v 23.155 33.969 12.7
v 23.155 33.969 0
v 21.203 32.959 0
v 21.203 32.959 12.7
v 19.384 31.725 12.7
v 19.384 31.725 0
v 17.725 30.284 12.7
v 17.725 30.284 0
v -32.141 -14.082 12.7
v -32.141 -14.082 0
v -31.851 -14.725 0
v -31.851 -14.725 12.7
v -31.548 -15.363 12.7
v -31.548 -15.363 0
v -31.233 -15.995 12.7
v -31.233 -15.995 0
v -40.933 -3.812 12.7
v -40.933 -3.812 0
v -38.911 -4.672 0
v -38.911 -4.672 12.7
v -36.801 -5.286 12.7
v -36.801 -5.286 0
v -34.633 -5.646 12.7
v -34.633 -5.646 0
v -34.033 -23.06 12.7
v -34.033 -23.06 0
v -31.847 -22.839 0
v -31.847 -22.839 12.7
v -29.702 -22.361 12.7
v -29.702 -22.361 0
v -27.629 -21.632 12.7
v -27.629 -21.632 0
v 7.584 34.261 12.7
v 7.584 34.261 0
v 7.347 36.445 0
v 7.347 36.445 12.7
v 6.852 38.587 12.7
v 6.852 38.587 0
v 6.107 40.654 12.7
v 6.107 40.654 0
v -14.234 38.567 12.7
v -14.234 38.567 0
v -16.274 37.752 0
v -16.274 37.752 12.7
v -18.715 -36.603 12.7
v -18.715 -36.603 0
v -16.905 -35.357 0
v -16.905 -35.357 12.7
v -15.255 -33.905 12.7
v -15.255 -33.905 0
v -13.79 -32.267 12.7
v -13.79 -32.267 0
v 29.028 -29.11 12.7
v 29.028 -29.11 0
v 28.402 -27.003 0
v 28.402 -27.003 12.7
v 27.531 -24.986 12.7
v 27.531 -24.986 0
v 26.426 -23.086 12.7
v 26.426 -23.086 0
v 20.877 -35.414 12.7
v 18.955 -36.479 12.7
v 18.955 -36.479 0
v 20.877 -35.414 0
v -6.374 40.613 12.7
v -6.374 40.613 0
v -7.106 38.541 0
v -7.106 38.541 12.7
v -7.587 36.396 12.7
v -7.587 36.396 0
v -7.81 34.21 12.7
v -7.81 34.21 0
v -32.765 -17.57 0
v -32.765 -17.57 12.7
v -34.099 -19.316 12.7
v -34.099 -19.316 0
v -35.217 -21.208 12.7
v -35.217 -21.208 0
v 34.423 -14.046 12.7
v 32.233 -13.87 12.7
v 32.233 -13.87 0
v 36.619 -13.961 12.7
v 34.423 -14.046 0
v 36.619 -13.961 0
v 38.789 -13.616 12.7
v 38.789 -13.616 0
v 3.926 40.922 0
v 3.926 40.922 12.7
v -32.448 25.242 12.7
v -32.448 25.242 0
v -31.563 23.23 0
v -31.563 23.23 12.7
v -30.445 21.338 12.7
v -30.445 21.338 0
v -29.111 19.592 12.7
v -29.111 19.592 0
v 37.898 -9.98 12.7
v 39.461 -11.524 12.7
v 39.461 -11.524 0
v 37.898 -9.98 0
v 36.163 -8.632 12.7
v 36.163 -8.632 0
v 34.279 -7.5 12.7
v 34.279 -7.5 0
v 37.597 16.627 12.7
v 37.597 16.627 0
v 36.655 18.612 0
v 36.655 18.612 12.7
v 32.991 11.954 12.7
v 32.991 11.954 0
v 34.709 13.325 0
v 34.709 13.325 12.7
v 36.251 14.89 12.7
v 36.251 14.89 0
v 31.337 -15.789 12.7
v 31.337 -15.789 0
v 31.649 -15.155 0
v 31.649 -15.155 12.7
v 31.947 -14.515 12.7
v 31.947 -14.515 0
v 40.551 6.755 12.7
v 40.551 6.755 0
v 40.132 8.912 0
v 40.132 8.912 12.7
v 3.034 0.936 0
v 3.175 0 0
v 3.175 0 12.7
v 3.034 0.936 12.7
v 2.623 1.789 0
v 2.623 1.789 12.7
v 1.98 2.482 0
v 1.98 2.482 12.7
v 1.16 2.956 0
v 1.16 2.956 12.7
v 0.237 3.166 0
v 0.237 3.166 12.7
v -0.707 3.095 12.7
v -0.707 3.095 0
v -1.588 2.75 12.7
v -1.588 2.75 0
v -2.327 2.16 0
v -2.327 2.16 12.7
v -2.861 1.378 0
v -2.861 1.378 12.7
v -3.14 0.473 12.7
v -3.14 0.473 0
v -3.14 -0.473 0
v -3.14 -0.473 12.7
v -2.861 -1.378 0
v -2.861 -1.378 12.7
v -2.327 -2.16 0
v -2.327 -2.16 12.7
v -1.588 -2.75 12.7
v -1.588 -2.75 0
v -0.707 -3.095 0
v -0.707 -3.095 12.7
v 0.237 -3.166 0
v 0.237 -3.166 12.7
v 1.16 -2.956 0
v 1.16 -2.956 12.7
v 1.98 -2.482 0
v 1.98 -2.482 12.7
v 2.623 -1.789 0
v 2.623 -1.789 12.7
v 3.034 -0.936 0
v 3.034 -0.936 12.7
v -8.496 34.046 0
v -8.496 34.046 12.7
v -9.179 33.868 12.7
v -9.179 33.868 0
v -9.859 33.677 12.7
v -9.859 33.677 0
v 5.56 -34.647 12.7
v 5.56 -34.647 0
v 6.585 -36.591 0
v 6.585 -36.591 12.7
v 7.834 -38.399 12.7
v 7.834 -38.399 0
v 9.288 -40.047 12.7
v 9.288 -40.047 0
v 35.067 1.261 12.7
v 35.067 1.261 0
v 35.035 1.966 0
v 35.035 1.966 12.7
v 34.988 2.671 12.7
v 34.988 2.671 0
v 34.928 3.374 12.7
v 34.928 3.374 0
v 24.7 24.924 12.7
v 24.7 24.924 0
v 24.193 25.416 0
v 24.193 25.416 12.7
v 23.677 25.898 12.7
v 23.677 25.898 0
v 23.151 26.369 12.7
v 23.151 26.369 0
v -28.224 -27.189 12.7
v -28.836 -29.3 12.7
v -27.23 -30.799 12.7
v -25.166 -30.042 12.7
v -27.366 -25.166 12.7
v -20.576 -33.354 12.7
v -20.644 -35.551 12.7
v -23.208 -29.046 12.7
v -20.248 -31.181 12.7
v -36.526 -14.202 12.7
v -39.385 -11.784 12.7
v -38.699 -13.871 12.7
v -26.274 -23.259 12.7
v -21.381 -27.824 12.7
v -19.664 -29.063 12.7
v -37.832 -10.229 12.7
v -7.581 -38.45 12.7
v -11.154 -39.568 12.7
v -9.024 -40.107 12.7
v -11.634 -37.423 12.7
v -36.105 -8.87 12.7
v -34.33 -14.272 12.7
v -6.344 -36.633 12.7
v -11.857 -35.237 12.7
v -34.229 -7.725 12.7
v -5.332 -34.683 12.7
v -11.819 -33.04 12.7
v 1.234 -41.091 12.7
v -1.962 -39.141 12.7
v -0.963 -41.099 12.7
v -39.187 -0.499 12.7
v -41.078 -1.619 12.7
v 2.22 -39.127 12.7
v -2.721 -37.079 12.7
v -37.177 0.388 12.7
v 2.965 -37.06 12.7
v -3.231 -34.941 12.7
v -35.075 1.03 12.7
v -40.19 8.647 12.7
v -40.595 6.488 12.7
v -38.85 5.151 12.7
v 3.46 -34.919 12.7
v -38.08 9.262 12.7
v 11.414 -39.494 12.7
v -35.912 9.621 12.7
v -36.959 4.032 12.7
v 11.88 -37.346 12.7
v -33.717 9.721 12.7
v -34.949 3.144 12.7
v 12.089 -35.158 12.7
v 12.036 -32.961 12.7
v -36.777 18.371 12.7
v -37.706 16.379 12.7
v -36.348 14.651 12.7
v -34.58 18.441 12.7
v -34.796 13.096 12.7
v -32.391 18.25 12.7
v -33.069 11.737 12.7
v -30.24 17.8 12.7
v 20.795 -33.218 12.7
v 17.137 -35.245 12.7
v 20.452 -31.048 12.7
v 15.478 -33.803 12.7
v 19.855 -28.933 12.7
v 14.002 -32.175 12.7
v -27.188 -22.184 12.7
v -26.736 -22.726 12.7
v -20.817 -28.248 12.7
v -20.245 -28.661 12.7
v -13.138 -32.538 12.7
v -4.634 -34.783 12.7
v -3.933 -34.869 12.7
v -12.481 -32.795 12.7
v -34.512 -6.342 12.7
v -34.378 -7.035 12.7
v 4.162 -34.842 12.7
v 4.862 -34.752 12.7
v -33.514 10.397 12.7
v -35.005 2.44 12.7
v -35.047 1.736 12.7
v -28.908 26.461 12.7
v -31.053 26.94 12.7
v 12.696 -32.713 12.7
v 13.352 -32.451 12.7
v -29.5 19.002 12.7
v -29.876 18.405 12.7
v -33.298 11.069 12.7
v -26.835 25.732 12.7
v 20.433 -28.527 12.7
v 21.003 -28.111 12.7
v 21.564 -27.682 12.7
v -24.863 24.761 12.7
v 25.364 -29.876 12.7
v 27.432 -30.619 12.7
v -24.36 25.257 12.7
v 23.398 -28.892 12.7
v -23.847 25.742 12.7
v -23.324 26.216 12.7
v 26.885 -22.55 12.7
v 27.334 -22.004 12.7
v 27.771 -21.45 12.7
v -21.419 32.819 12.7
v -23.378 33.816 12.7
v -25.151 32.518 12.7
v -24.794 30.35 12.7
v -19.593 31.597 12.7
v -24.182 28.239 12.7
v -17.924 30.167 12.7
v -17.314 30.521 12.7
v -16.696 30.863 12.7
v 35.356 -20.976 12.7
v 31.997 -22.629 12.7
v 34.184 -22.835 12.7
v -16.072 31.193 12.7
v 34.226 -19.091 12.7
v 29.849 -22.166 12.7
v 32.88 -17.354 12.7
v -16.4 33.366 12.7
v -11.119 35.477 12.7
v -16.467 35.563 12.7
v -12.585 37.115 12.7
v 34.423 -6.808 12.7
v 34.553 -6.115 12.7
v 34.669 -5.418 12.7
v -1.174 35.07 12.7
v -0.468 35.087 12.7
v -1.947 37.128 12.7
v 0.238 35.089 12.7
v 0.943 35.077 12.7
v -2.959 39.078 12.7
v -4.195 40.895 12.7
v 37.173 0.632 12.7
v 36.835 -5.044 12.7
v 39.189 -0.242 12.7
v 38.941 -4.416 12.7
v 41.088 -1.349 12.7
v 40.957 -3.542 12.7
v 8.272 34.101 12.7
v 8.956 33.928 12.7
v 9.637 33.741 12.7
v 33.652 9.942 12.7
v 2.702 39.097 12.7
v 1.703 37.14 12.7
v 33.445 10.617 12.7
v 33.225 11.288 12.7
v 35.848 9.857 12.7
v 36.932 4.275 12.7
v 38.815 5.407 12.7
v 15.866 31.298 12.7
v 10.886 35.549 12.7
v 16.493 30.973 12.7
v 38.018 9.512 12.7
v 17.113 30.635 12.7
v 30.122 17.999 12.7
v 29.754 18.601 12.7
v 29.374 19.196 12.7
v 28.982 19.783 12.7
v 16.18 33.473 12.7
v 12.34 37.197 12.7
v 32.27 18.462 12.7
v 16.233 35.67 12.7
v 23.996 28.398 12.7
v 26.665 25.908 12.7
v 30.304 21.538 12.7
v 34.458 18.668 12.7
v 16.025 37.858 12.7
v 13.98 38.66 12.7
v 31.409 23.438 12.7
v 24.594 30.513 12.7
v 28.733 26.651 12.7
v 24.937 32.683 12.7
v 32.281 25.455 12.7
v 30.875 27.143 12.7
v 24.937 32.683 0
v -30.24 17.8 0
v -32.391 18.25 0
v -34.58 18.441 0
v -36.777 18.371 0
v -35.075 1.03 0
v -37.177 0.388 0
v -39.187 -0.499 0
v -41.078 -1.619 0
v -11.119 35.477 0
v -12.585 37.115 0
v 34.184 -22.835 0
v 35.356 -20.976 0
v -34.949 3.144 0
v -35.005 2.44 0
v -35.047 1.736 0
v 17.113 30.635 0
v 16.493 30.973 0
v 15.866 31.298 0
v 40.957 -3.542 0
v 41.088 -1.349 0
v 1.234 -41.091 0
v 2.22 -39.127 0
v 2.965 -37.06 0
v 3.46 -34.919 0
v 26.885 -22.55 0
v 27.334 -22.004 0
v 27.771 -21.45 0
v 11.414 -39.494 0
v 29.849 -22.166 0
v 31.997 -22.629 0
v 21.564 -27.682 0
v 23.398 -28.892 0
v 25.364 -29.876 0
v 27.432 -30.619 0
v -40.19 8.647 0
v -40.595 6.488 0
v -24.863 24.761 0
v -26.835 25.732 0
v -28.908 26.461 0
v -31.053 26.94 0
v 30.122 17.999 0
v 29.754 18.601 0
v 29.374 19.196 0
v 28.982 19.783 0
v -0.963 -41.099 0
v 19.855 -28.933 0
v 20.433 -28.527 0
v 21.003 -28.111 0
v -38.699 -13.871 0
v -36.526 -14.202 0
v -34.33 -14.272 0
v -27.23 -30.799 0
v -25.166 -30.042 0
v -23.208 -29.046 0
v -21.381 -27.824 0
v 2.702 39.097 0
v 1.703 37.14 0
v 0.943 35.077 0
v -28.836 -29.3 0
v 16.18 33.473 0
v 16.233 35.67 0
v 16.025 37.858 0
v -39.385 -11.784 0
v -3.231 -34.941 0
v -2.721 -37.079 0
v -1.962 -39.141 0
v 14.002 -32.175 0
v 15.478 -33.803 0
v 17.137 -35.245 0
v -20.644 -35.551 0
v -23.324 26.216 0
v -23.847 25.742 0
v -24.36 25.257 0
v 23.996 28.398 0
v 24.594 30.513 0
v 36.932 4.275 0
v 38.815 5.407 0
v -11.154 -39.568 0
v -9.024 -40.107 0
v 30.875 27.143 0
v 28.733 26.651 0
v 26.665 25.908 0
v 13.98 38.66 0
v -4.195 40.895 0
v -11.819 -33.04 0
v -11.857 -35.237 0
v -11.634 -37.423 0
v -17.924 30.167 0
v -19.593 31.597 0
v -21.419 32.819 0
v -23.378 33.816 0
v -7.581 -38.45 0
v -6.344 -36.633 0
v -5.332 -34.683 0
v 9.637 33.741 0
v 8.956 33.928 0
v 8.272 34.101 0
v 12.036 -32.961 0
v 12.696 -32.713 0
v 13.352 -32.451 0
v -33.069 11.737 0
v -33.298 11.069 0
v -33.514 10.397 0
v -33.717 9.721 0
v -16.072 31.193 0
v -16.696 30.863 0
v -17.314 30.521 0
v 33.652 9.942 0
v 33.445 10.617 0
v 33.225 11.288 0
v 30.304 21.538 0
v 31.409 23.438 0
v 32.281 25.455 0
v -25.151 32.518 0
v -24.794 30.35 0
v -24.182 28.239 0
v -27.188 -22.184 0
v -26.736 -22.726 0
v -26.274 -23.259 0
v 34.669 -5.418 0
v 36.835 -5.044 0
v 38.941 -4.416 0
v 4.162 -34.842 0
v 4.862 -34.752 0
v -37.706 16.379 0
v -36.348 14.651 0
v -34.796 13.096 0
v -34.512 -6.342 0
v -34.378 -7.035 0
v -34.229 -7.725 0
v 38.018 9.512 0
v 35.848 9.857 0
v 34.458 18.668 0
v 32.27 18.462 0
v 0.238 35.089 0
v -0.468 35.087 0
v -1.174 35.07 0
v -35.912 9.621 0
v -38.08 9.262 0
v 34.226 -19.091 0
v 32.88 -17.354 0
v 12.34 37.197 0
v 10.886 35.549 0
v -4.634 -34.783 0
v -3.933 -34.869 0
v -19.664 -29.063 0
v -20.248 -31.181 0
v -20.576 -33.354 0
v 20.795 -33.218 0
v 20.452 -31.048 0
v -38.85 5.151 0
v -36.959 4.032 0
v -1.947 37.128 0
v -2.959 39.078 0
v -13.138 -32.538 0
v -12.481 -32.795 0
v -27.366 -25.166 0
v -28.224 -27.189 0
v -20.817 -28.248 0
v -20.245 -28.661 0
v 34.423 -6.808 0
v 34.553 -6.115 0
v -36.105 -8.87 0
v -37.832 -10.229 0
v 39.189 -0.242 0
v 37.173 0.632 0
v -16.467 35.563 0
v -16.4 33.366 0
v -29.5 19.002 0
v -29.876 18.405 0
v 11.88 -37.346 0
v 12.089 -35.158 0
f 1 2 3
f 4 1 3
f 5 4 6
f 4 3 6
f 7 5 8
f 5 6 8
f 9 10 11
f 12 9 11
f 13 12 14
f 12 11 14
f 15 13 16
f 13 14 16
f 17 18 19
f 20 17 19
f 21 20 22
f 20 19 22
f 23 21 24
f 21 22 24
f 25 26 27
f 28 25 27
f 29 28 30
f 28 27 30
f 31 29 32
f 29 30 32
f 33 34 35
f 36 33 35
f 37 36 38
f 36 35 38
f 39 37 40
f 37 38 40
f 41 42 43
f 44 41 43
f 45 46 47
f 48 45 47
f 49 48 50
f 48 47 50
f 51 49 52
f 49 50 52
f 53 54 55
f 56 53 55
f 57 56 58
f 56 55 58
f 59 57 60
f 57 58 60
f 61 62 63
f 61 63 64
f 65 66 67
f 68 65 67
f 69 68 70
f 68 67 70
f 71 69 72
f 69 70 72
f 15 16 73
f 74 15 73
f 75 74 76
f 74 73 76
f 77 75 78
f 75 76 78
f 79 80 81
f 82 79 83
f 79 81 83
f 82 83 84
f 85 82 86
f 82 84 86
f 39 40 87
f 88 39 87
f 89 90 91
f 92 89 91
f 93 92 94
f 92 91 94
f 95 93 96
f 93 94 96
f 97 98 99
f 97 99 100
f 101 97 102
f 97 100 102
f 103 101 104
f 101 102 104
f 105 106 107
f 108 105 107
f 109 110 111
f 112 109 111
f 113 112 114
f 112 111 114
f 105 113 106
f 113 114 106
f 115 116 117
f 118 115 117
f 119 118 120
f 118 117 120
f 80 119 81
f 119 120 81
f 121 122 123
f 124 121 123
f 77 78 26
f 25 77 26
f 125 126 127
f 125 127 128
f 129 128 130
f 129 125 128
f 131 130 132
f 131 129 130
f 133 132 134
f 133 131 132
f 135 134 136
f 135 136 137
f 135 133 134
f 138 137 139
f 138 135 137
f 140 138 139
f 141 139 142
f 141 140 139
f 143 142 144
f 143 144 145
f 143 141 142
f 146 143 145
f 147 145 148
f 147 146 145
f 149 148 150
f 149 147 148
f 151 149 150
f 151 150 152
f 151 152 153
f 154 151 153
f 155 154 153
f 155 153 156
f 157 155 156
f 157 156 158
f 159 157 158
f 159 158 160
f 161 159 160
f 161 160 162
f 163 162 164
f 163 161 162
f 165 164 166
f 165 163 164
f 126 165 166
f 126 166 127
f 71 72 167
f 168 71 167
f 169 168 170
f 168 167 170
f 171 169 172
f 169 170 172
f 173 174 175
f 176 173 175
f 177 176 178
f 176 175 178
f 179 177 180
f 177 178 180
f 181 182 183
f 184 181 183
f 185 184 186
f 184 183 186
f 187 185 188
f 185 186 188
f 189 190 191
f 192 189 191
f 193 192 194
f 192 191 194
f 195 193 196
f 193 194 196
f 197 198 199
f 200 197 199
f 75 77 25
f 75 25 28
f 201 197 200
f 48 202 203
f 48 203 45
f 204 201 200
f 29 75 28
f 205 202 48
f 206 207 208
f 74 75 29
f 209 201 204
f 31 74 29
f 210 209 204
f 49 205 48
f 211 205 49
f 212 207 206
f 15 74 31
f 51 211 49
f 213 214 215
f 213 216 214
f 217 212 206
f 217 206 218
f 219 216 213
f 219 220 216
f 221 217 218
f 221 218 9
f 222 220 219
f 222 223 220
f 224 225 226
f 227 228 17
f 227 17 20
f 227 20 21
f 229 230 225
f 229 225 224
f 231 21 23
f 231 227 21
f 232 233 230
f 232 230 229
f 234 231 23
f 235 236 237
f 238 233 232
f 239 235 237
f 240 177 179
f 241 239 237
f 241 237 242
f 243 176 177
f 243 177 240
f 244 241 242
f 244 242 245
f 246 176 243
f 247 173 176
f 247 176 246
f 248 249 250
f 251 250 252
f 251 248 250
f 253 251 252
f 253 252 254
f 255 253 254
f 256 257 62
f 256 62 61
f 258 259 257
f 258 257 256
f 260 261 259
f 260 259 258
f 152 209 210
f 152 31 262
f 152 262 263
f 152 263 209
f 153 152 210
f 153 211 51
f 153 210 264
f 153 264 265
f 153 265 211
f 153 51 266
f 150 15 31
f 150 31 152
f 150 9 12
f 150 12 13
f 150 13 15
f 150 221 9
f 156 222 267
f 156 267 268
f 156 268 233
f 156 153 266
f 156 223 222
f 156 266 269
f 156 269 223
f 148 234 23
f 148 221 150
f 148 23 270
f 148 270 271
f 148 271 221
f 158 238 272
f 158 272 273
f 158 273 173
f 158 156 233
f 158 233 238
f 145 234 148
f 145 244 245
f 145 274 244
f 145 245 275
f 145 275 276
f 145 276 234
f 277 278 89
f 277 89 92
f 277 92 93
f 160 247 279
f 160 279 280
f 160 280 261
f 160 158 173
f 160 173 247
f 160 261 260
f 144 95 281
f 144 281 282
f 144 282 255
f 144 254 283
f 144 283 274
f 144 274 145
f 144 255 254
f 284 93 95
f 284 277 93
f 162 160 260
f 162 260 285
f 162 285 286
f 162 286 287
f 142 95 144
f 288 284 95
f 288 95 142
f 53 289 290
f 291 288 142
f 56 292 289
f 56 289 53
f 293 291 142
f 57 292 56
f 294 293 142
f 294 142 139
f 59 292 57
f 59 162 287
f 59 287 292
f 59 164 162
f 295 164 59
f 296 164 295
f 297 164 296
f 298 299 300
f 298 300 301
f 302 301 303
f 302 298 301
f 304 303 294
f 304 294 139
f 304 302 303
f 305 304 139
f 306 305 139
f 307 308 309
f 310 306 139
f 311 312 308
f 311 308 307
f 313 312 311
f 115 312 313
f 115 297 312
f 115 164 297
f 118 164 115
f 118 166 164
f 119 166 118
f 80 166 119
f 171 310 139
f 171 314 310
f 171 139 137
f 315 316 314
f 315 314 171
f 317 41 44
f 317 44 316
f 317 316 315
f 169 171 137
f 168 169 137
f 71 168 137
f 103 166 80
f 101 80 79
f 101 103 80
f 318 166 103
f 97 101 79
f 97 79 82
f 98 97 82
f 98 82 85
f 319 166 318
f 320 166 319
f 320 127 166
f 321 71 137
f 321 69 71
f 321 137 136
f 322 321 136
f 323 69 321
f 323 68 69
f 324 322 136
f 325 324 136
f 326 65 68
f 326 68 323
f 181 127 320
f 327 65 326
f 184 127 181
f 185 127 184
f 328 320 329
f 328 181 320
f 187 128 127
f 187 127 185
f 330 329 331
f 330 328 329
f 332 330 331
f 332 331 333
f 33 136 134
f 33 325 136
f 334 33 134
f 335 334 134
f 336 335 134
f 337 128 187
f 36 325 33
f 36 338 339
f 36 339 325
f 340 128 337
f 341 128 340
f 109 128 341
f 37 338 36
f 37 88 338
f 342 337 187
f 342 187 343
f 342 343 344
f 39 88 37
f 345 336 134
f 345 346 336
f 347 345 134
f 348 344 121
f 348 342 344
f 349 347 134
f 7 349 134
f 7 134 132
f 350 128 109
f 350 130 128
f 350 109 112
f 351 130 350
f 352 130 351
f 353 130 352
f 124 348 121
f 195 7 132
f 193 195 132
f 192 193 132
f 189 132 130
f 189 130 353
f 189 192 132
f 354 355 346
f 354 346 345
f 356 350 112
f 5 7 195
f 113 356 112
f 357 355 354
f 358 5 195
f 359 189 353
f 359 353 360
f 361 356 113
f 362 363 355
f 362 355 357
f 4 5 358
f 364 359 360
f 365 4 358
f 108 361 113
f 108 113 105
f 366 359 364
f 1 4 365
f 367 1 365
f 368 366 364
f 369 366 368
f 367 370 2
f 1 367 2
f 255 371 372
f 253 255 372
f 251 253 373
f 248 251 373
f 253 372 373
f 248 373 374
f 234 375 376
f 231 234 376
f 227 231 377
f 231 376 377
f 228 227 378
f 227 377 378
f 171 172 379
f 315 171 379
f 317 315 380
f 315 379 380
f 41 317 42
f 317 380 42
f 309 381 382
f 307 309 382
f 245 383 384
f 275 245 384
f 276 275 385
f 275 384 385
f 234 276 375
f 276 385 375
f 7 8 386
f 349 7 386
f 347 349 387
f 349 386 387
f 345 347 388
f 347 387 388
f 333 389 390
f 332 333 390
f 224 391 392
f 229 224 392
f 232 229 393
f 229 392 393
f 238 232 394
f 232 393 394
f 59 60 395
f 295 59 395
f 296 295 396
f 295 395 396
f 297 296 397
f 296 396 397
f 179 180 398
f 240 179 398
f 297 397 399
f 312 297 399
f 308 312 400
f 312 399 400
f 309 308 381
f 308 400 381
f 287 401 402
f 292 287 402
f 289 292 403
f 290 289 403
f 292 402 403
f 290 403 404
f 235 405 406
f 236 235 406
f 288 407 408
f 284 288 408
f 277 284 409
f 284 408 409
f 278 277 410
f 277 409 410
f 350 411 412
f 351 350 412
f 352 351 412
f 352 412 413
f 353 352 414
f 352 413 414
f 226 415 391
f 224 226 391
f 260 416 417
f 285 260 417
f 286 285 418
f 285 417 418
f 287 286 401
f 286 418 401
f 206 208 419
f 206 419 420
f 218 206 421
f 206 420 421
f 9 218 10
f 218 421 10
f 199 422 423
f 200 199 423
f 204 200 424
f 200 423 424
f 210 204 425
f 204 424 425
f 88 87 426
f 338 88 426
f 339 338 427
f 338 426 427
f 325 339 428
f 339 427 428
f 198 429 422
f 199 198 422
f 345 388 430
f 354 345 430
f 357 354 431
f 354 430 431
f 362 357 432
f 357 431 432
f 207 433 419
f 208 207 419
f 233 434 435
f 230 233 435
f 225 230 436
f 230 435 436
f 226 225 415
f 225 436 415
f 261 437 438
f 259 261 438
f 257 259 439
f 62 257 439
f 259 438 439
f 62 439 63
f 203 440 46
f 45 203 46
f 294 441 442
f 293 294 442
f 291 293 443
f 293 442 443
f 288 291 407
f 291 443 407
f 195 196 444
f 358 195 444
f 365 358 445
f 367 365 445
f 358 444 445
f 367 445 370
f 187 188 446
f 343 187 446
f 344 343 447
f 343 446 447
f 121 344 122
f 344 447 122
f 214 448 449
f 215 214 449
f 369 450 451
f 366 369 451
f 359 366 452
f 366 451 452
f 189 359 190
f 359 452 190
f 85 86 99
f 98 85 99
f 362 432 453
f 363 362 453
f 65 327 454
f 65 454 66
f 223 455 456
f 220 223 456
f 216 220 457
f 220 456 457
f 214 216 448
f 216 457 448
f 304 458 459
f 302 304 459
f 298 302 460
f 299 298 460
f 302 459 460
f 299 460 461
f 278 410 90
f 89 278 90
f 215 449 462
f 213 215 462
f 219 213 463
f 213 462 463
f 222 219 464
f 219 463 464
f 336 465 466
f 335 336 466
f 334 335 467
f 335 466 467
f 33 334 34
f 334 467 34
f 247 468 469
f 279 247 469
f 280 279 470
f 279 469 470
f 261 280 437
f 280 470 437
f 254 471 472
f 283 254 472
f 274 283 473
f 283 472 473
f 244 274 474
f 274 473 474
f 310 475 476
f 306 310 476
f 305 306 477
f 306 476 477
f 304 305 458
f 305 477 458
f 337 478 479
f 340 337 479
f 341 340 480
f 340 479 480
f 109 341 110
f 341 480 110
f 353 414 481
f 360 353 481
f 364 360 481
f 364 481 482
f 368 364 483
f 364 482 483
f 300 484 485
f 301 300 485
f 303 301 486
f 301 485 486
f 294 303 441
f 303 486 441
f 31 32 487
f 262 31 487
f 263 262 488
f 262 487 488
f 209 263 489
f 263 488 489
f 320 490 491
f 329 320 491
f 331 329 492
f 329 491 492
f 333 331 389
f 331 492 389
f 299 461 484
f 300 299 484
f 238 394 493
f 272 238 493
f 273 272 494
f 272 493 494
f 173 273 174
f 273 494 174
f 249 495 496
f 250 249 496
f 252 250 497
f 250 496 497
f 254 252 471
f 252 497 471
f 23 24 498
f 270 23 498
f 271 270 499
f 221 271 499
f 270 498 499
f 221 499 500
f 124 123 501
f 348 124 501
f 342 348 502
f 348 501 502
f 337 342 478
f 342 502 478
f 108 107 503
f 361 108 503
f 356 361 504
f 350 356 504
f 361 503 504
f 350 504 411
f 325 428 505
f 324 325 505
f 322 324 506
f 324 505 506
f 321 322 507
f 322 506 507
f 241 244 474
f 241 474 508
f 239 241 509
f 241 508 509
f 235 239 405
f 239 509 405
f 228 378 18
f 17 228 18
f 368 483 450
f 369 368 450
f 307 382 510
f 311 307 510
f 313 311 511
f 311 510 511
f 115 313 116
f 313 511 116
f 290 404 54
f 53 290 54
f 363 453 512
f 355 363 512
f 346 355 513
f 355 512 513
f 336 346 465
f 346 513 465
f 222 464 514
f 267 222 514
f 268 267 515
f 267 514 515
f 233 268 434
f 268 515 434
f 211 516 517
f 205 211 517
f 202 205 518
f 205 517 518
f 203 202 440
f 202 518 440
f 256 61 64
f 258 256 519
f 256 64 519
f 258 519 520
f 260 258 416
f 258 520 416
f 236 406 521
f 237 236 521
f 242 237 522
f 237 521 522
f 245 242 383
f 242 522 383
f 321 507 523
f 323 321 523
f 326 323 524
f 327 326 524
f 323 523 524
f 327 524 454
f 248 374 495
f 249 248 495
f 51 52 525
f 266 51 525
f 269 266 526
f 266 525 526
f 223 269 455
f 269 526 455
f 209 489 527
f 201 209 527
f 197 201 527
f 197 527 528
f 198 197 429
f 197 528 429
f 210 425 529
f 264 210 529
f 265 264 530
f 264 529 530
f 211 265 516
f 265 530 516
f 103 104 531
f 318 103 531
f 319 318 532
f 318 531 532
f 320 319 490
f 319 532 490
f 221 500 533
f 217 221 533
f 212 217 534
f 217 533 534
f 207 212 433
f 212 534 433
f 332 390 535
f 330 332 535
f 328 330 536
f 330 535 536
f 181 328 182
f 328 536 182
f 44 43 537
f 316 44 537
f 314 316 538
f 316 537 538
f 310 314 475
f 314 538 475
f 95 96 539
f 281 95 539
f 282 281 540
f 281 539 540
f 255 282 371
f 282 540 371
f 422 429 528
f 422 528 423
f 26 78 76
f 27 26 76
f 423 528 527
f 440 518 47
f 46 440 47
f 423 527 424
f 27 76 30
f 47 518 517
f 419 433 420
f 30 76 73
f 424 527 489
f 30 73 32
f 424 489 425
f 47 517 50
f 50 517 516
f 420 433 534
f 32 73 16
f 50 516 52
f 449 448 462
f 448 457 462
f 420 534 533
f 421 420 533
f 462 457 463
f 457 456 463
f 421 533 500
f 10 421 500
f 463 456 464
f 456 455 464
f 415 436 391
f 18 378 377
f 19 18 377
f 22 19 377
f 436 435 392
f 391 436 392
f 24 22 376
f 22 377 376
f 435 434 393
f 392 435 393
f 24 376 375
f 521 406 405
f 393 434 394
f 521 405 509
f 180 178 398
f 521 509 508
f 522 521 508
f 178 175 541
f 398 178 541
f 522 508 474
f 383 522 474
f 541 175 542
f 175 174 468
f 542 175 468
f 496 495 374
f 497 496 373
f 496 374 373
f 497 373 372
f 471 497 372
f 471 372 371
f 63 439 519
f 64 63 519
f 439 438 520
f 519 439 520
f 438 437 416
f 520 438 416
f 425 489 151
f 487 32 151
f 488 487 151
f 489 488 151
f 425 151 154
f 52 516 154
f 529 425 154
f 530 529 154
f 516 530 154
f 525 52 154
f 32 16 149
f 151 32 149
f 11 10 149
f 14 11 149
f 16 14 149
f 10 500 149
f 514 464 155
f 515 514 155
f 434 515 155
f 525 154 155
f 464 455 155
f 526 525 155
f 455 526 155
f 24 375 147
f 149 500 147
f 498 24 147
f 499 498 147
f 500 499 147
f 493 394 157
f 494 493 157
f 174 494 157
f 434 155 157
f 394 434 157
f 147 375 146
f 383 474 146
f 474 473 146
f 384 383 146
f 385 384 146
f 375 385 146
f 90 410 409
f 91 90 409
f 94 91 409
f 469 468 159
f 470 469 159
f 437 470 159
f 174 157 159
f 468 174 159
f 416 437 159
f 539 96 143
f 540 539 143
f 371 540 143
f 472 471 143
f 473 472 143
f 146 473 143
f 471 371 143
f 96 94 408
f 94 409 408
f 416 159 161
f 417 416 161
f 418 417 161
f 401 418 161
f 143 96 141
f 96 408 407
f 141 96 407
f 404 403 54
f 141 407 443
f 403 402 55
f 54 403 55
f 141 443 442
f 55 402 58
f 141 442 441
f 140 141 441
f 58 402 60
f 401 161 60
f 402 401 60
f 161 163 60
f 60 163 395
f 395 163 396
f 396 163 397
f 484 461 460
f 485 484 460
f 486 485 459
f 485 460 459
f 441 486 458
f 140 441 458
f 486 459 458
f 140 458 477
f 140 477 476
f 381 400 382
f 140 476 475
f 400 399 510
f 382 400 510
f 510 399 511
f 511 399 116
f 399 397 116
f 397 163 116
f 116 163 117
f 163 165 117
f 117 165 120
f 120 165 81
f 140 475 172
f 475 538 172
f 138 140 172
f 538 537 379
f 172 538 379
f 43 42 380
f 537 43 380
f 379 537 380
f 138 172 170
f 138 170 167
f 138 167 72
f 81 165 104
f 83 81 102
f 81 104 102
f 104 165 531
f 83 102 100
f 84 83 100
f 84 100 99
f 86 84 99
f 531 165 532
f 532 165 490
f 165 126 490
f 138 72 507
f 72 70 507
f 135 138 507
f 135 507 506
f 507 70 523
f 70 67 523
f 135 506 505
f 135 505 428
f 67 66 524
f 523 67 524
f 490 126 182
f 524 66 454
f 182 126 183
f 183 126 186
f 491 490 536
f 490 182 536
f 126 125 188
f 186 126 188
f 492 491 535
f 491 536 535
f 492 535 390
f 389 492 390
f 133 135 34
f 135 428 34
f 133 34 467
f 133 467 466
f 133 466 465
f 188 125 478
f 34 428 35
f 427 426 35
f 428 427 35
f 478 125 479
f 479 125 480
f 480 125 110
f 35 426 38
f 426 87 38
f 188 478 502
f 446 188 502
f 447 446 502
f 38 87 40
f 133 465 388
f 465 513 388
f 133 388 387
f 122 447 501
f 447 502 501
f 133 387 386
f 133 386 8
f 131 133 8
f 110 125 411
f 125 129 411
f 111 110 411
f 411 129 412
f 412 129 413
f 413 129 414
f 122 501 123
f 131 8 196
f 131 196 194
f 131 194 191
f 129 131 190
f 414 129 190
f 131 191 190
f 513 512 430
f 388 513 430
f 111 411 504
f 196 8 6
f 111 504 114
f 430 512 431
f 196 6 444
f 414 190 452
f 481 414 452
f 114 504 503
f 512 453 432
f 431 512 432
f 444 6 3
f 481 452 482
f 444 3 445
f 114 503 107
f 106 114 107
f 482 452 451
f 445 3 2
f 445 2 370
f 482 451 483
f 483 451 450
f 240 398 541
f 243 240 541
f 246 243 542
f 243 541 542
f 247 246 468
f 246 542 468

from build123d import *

# Parameters (mm, degrees)
SKETCH1_R        = 3.175
EXTRUSION2_DEPTH = 12.7


with BuildPart() as part:
    # Sketch1 → Extrusion2 (new body)
    with BuildSketch(Plane.XY):
        with BuildLine():
            Line((-14.233622753, 38.567186329), (-16.273931786, 37.751596287))
            ThreePointArc((-16.273931786, 37.751596287), (-16.466248372, 34.463305312), (-16.071921005, 31.19308374))
            ThreePointArc((-16.071921005, 31.19308374), (-17.005853093, 30.69390947), (-17.924297324, 30.166781125))
            ThreePointArc((-17.924297324, 30.166781125), (-20.487810109, 32.23517311), (-23.377716537, 33.815769214))
            Line((-23.377716537, 33.815769214), (-25.151096514, 32.51839821))
            ThreePointArc((-25.151096514, 32.51839821), (-24.51960641, 29.285587753), (-23.324396528, 26.216171433))
            ThreePointArc((-23.324396528, 26.216171433), (-24.10484783, 25.500420175), (-24.863345957, 24.761444744))
            ThreePointArc((-24.863345957, 24.761444744), (-27.860709444, 26.127334686), (-31.052902414, 26.939582953))
            Line((-31.052902414, 26.939582953), (-32.447925349, 25.241949579))
            ThreePointArc((-32.447925349, 25.241949579), (-31.0323074, 22.26774901), (-29.111314436, 19.592000659))
            ThreePointArc((-29.111314436, 19.592000659), (-29.689246325, 18.704645697), (-30.240139123, 17.800255724))
            ThreePointArc((-30.240139123, 17.800255724), (-33.483017939, 18.377819734), (-36.776920227, 18.370683619))
            Line((-36.776920227, 18.370683619), (-37.7059317, 16.379456422))
            ThreePointArc((-37.7059317, 16.379456422), (-35.595134387, 13.850745701), (-33.069061394, 11.736792429))
            ThreePointArc((-33.069061394, 11.736792429), (-33.408160285, 10.733589538), (-33.716833132, 9.720611171))
            ThreePointArc((-33.716833132, 9.720611171), (-37.001465276, 9.47355878), (-40.190108886, 8.64748667))
            Line((-40.190108886, 8.64748667), (-40.594735688, 6.487781779))
            ThreePointArc((-40.594735688, 6.487781779), (-37.921388171, 4.563449101), (-34.948957606, 3.144118365))
            ThreePointArc((-34.948957606, 3.144118365), (-35.027916668, 2.088102473), (-35.074974514, 1.030184869))
            ThreePointArc((-35.074974514, 1.030184869), (-38.194974467, -0.025960715), (-41.078005196, -1.619063669))
            Line((-41.078005196, -1.619063669), (-40.932823137, -3.811544054))
            ThreePointArc((-40.932823137, -3.811544054), (-37.864901671, -5.01058579), (-34.632882277, -5.646112218))
            ThreePointArc((-34.632882277, -5.646112218), (-34.446740222, -6.688587749), (-34.22922625, -7.724971737))
            ThreePointArc((-34.22922625, -7.724971737), (-36.988552942, -9.523849001), (-39.384819364, -11.783882284))
            Line((-39.384819364, -11.783882284), (-38.698950767, -13.871376555))
            ThreePointArc((-38.698950767, -13.871376555), (-35.429224142, -14.269787147), (-32.140695585, -14.081576806))
            ThreePointArc((-32.140695585, -14.081576806), (-31.701148402, -15.045009405), (-31.232729815, -15.994739958))
            ThreePointArc((-31.232729815, -15.994739958), (-33.4580046, -18.423318829), (-35.216940485, -21.208276236))
            Line((-35.216940485, -21.208276236), (-34.033480996, -23.059619453))
            ThreePointArc((-34.033480996, -23.059619453), (-30.76739816, -22.632365298), (-27.628990783, -21.632244135))
            ThreePointArc((-27.628990783, -21.632244135), (-26.96365684, -22.456097788), (-26.273766099, -23.259499844))
            ThreePointArc((-26.273766099, -23.259499844), (-27.82516678, -26.165183779), (-28.836251716, -29.300076195))
            Line((-28.836251716, -29.300076195), (-27.229562447, -30.798941653))
            ThreePointArc((-27.229562447, -30.798941653), (-24.172343397, -29.572868701), (-21.381254878, -27.823678007))
            ThreePointArc((-21.381254878, -27.823678007), (-20.531939552, -28.456186959), (-19.663925031, -29.062779812))
            ThreePointArc((-19.663925031, -29.062779812), (-20.443971397, -32.262994003), (-20.643675199, -35.550844607))
            Line((-20.643675199, -35.550844607), (-18.714710347, -36.603053078))
            ThreePointArc((-18.714710347, -36.603053078), (-16.058451399, -34.655200002), (-13.790056095, -32.266847861))
            ThreePointArc((-13.790056095, -32.266847861), (-12.810124992, -32.668269249), (-11.818527235, -33.039938438))
            ThreePointArc((-11.818527235, -33.039938438), (-11.778206103, -36.333601659), (-11.153980648, -39.567822706))
            Line((-11.153980648, -39.567822706), (-9.023944168, -40.107260062))
            ThreePointArc((-9.023944168, -40.107260062), (-6.935547841, -37.560017634), (-5.332377371, -34.682572995))
            ThreePointArc((-5.332377371, -34.682572995), (-4.283403166, -34.827684036), (-3.230527907, -34.941076221))
            ThreePointArc((-3.230527907, -34.941076221), (-2.372372803, -38.121235497), (-0.963440471, -41.098608985))
            Line((-0.963440471, -41.098608985), (1.233829612, -41.091380392))
            ThreePointArc((1.233829612, -41.091380392), (2.623141695, -38.104801222), (3.460354235, -34.919064515))
            ThreePointArc((3.460354235, -34.919064515), (4.512460635, -34.798747349), (5.560457371, -34.64673768))
            ThreePointArc((5.560457371, -34.64673768), (7.182525405, -37.513571908), (9.287636214, -40.04701851))
            Line((9.287636214, -40.04701851), (11.414077338, -39.493578168))
            ThreePointArc((11.414077338, -39.493578168), (12.017009592, -36.255320009), (12.035659057, -32.961462787))
            ThreePointArc((12.035659057, -32.961462787), (13.024789938, -32.583277384), (14.002058661, -32.175417188))
            ThreePointArc((14.002058661, -32.175417188), (16.286119127, -34.548792632), (18.955136559, -36.47912658))
            Line((18.955136559, -36.47912658), (20.877136608, -35.414249181))
            ThreePointArc((20.877136608, -35.414249181), (20.65580458, -32.127783703), (19.854719157, -28.932771129))
            ThreePointArc((19.854719157, -28.932771129), (20.718723787, -28.320480269), (21.563859111, -27.682396902))
            ThreePointArc((21.563859111, -27.682396902), (24.366396088, -29.413185652), (27.431615961, -30.619116966))
            Line((27.431615961, -30.619116966), (29.028408604, -29.109712673))
            ThreePointArc((29.028408604, -29.109712673), (27.9967194, -25.981540589), (26.426234232, -23.086127053))
            ThreePointArc((26.426234232, -23.086127053), (27.110824023, -22.278203223), (27.770722986, -21.44998981))
            ThreePointArc((27.770722986, -21.44998981), (30.915642769, -22.429440044), (34.184466045, -22.835195624))
            Line((34.184466045, -22.835195624), (35.355718928, -20.97610586))
            ThreePointArc((35.355718928, -20.97610586), (33.578497375, -18.202781726), (31.337291821, -15.78889671))
            ThreePointArc((31.337291821, -15.78889671), (31.799451478, -14.836104734), (32.232650202, -13.869800971))
            ThreePointArc((32.232650202, -13.869800971), (35.522345915, -14.036370229), (38.789380407, -13.616454959))
            Line((38.789380407, -13.616454959), (39.461499403, -11.524493171))
            ThreePointArc((39.461499403, -11.524493171), (37.050414867, -9.280275142), (34.279312115, -7.499591919))
            ThreePointArc((34.279312115, -7.499591919), (34.490002447, -6.461799222), (34.669281463, -5.418121527))
            ThreePointArc((34.669281463, -5.418121527), (37.897049426, -4.761343649), (40.95701534, -3.542142351))
            Line((40.95701534, -3.542142351), (41.087768741, -1.348754192))
            ThreePointArc((41.087768741, -1.348754192), (38.194318531, 0.225345259), (35.067437158, 1.260939814))
            ThreePointArc((35.067437158, 1.260939814), (35.013419717, 2.318524899), (34.927514264, 3.373998419))
            ThreePointArc((34.927514264, 3.373998419), (37.890541945, 4.812855662), (40.55117037, 6.754736088))
            Line((40.55117037, 6.754736088), (40.132342459, 8.911731973))
            ThreePointArc((40.132342459, 8.911731973), (36.938332693, 9.716806389), (33.652146155, 9.942242061))
            ThreePointArc((33.652146155, 9.942242061), (33.336815056, 10.953167575), (32.99112289, 11.954117636))
            ThreePointArc((32.99112289, 11.954117636), (35.503232362, 14.084645553), (37.597346229, 16.627189616))
            Line((37.597346229, 16.627189616), (36.655253504, 18.612261243))
            ThreePointArc((36.655253504, 18.612261243), (33.361375562, 18.597724838), (30.122367045, 17.998836674))
            ThreePointArc((30.122367045, 17.998836674), (29.565535701, 18.899582449), (28.981777932, 19.783115677))
            ThreePointArc((28.981777932, 19.783115677), (30.885124119, 22.471445363), (32.281142551, 25.454895671))
            Line((32.281142551, 25.454895671), (30.874980162, 27.143313689))
            ThreePointArc((30.874980162, 27.143313689), (27.68820051, 26.310079837), (24.699888832, 24.924498184))
            ThreePointArc((24.699888832, 24.924498184), (23.936545003, 25.65846705), (23.151401279, 26.369067803))
            ThreePointArc((23.151401279, 26.369067803), (24.326389939, 29.446281617), (24.936595965, 32.683177014))
            Line((24.936595965, 32.683177014), (23.154718267, 33.968851909))
            ThreePointArc((23.154718267, 33.968851909), (20.27527399, 32.369275759), (17.725425763, 30.284061807))
            ThreePointArc((17.725425763, 30.284061807), (16.80353315, 30.805135801), (15.866336939, 31.298154421))
            ThreePointArc((15.866336939, 31.298154421), (16.239139213, 34.570899701), (16.025191344, 37.857854144))
            Line((16.025191344, 37.857854144), (13.979560266, 38.660002235))
            ThreePointArc((13.979560266, 38.660002235), (11.588377438, 36.394591039), (9.637209004, 33.74076645))
            ThreePointArc((9.637209004, 33.74076645), (8.61469351, 34.016204576), (7.584332296, 34.26066289))
            ThreePointArc((7.584332296, 34.26066289), (7.131523647, 37.523301014), (6.106865014, 40.653783068))
            Line((6.106865014, 40.653783068), (3.92601508, 40.922002439))
            ThreePointArc((3.92601508, 40.922002439), (2.173340512, 38.133100314), (0.943450961, 35.077414647))
            ThreePointArc((0.943450961, 35.077414647), (-0.115439006, 35.089910115), (-1.174223838, 35.070447907))
            ThreePointArc((-1.174223838, 35.070447907), (-2.424191777, 38.117975323), (-4.195178104, 40.895285287))
            Line((-4.195178104, 40.895285287), (-6.374216073, 40.612722729))
            ThreePointArc((-6.374216073, 40.612722729), (-7.378255391, 37.475566652), (-7.809587577, 34.210019876))
            ThreePointArc((-7.809587577, 34.210019876), (-8.838318064, 33.958787549), (-9.858999169, 33.676627702))
            ThreePointArc((-9.858999169, 33.676627702), (-11.827586317, 36.317557055), (-14.233622753, 38.567186329))
        make_face()
        Circle(SKETCH1_R, mode=Mode.SUBTRACT)
    extrude(amount=EXTRUSION2_DEPTH)


solid = part.part
